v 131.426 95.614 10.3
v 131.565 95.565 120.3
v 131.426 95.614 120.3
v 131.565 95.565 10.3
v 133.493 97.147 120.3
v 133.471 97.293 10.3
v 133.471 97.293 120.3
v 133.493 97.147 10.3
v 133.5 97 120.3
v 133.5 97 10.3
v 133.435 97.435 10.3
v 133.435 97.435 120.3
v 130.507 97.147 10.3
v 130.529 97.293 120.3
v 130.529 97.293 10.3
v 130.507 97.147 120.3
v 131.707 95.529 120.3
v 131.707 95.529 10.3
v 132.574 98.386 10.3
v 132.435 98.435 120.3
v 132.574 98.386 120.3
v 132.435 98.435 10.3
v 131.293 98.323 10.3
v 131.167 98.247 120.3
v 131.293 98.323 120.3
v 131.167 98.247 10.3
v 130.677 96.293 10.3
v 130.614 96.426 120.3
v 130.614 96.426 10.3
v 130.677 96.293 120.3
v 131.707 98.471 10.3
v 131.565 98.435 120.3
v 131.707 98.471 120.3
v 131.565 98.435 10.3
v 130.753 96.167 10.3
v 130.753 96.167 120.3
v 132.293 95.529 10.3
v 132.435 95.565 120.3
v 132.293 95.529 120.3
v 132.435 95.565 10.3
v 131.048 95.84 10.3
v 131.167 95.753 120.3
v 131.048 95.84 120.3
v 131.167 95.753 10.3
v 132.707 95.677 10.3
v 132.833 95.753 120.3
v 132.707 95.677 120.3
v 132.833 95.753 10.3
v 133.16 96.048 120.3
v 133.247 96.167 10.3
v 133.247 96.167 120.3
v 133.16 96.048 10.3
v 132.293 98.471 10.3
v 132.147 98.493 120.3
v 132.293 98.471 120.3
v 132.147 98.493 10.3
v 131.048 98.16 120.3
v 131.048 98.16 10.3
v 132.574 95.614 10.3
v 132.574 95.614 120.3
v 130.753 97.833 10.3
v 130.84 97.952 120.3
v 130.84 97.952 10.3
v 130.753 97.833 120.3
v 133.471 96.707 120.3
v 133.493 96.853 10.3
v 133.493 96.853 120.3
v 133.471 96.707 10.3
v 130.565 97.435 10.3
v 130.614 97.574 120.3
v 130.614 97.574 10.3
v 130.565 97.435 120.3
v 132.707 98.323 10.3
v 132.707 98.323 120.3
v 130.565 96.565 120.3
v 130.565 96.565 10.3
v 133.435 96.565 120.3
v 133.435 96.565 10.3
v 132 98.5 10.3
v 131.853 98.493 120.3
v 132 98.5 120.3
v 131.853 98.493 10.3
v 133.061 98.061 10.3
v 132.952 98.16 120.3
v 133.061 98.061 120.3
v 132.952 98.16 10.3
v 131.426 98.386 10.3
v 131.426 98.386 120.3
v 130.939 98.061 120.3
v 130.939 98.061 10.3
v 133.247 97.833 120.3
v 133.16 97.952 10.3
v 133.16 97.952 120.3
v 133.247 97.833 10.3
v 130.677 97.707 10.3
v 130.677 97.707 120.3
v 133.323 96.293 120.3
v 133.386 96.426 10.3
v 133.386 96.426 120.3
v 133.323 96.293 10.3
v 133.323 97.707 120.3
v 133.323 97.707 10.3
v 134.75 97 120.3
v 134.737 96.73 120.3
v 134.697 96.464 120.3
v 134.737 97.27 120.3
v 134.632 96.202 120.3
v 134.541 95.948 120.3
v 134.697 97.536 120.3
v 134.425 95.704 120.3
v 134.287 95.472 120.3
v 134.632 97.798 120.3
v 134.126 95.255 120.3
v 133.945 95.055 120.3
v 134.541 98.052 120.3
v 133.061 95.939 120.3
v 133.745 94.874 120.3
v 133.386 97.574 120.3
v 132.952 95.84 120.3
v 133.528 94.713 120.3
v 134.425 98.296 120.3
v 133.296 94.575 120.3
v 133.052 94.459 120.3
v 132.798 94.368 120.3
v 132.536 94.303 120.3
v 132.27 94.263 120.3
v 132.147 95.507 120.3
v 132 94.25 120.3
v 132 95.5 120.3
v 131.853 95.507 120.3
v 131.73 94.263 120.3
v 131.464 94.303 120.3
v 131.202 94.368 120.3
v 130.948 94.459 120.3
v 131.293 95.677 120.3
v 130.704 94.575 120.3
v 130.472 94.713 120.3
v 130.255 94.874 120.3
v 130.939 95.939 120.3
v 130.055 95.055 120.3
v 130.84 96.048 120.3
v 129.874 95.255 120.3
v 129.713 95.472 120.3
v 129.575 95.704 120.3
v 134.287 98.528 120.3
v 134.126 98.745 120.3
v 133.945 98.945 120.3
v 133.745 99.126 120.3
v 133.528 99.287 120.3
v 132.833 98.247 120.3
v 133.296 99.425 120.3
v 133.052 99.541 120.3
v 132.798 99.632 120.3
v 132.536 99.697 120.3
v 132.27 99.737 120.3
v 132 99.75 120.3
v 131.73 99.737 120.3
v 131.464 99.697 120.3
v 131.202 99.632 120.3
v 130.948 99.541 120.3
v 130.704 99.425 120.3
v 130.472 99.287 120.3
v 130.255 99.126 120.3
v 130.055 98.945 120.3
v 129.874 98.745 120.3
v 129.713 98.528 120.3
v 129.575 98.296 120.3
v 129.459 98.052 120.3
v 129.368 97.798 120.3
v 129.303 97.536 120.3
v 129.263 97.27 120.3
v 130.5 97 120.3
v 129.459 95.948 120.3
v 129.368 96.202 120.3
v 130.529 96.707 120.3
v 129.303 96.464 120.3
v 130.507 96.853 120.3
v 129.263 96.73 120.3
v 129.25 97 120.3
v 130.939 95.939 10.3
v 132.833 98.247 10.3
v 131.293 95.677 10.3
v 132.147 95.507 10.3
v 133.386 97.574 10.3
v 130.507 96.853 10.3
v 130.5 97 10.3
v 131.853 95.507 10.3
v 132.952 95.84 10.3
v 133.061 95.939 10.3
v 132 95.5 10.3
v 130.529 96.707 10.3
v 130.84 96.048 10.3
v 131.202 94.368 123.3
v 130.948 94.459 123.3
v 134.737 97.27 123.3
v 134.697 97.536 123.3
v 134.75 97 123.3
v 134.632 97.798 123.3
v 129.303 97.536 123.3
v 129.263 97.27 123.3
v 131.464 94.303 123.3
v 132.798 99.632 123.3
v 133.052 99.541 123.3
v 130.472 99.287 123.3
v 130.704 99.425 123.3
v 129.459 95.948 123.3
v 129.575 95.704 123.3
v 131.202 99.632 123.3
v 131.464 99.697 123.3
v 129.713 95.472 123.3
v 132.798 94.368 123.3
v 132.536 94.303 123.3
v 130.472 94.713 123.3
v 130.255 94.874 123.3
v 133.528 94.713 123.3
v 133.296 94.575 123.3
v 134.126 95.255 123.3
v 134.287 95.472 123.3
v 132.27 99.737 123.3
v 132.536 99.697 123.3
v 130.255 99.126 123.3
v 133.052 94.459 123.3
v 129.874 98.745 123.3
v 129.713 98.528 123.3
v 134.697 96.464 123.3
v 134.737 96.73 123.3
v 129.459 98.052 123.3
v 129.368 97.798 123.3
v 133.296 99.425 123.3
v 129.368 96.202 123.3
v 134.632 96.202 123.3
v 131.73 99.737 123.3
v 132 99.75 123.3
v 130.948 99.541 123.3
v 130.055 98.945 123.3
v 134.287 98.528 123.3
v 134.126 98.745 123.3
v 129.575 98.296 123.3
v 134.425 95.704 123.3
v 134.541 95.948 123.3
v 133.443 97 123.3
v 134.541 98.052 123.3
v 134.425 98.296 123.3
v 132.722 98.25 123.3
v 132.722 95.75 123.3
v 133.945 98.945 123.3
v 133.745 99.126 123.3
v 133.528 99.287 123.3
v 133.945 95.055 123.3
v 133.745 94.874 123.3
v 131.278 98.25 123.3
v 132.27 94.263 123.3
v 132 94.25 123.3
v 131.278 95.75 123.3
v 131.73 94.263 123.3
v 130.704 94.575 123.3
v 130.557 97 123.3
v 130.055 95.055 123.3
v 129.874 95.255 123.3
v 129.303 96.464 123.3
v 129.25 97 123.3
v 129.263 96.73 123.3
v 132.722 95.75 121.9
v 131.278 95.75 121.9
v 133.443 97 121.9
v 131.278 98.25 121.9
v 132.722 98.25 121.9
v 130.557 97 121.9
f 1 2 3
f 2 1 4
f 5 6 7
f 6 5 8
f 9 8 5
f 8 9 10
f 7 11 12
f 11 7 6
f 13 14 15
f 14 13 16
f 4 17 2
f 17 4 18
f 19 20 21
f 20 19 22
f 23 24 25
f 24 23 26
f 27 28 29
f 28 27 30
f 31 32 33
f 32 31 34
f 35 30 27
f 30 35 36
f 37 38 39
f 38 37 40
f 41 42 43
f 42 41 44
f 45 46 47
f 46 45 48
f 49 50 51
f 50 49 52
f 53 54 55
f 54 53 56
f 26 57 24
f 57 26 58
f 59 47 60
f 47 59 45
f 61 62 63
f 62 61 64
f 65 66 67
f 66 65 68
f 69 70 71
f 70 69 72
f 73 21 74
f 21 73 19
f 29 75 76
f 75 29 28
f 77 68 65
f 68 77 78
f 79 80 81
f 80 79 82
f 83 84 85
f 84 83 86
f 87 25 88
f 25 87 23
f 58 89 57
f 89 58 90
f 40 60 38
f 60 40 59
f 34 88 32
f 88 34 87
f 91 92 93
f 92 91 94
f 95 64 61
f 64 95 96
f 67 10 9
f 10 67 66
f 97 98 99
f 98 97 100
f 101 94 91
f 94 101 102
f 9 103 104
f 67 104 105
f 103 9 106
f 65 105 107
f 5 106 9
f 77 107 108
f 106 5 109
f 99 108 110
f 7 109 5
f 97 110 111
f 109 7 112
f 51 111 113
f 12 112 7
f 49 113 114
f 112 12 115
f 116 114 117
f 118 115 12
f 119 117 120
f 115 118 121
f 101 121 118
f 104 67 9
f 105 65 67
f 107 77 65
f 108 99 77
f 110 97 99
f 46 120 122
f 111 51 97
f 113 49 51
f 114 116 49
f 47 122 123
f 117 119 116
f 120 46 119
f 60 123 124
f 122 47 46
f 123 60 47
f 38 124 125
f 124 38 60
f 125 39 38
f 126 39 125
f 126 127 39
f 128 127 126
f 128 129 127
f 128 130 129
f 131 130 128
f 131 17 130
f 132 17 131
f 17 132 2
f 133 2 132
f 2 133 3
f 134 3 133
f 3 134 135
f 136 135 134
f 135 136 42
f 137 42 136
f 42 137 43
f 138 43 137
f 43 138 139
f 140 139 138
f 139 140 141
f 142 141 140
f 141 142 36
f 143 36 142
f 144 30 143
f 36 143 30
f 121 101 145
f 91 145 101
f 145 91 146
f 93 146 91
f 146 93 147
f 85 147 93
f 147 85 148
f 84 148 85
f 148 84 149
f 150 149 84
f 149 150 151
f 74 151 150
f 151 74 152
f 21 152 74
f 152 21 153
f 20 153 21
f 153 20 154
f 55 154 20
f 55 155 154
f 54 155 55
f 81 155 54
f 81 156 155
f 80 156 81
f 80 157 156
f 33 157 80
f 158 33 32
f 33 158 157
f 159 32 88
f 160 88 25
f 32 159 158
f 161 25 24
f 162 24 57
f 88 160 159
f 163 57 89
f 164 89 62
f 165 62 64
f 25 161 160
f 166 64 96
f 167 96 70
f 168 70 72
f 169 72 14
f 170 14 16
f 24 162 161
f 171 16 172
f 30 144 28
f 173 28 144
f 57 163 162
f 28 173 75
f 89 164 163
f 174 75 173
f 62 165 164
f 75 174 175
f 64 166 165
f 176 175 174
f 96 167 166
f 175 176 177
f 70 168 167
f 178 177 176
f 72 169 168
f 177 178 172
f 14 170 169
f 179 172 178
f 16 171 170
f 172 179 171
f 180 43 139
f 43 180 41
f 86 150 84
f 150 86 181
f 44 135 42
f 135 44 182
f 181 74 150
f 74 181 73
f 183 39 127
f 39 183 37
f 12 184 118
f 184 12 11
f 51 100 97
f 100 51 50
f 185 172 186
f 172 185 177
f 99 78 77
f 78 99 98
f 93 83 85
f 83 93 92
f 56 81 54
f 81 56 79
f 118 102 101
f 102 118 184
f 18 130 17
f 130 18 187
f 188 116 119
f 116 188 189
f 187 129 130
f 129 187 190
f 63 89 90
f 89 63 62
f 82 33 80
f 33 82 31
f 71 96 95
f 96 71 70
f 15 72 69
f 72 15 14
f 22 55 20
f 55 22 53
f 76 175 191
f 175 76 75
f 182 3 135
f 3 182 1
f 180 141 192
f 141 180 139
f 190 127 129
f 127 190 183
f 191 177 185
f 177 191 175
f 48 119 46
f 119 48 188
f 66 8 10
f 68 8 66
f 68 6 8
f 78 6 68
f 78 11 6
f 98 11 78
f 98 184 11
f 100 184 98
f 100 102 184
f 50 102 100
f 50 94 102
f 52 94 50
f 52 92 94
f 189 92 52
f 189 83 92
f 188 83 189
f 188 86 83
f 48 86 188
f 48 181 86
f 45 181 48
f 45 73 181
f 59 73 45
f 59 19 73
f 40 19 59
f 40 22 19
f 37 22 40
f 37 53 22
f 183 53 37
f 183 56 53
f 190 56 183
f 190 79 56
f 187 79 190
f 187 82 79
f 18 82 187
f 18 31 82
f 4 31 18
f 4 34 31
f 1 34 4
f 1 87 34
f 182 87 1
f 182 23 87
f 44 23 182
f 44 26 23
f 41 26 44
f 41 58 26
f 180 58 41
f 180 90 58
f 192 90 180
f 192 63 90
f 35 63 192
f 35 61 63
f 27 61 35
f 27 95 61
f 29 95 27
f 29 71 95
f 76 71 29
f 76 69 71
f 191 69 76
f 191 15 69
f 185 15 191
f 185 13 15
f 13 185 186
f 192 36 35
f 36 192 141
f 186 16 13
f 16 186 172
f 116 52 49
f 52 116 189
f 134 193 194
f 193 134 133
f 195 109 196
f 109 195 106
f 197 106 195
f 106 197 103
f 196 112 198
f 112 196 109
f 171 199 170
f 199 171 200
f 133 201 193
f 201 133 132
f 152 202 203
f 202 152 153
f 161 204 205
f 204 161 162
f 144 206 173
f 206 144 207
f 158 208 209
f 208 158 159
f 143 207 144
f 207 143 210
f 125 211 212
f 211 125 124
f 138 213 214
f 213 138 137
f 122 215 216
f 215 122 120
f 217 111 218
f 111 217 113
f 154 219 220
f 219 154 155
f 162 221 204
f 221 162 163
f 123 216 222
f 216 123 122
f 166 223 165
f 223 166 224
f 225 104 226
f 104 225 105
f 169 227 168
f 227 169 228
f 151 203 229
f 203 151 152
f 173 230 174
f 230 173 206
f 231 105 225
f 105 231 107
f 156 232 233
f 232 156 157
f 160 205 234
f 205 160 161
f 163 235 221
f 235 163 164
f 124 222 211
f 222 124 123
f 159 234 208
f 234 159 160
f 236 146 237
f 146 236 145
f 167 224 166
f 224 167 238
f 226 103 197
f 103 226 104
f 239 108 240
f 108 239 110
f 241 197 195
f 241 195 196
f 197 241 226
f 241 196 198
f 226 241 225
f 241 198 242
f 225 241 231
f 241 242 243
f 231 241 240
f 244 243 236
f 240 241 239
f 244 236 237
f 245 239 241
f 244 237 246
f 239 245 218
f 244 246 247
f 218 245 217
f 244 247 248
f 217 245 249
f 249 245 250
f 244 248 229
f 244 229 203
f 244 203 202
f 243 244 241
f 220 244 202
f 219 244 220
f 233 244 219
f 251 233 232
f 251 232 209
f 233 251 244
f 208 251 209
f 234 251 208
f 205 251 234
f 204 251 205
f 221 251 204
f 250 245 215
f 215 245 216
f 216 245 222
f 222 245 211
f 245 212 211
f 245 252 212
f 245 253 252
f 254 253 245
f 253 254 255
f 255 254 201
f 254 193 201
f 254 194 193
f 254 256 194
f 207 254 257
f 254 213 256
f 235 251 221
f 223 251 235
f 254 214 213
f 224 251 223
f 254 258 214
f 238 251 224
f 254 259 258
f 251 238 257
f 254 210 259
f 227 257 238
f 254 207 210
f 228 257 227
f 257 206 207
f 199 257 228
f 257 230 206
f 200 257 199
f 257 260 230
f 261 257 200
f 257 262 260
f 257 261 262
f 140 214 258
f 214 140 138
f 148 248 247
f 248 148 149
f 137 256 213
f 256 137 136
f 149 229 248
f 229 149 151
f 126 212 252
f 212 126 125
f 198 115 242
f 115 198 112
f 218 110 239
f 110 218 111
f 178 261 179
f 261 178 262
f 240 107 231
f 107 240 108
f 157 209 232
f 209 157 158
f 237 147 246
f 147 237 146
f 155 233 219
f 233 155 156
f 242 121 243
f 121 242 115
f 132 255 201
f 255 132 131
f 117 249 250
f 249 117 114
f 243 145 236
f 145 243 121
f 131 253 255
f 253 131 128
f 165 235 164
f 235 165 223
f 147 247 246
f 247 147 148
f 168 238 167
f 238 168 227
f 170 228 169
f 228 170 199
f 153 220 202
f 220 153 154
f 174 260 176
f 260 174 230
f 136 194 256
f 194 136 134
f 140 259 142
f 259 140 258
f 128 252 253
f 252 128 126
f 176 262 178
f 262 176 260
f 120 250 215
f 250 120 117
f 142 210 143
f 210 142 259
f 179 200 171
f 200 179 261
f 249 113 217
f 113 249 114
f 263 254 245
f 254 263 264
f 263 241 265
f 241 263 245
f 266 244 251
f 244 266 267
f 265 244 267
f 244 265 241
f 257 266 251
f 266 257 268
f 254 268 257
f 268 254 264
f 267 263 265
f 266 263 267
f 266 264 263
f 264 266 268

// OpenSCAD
// Generated from the same CSG operations as STEP. Rebuild with spec/build_parent_hand_service.py.
difference(){union(){translate([132,97,10.3]) cylinder(r=1.5,h=110,$fn=64);translate([132,97,120.3]) cylinder(r=2.75,h=3,$fn=64);}translate([132,97,121.9]) cylinder(r=1.4433756729740643,h=1.5,$fn=6);}
